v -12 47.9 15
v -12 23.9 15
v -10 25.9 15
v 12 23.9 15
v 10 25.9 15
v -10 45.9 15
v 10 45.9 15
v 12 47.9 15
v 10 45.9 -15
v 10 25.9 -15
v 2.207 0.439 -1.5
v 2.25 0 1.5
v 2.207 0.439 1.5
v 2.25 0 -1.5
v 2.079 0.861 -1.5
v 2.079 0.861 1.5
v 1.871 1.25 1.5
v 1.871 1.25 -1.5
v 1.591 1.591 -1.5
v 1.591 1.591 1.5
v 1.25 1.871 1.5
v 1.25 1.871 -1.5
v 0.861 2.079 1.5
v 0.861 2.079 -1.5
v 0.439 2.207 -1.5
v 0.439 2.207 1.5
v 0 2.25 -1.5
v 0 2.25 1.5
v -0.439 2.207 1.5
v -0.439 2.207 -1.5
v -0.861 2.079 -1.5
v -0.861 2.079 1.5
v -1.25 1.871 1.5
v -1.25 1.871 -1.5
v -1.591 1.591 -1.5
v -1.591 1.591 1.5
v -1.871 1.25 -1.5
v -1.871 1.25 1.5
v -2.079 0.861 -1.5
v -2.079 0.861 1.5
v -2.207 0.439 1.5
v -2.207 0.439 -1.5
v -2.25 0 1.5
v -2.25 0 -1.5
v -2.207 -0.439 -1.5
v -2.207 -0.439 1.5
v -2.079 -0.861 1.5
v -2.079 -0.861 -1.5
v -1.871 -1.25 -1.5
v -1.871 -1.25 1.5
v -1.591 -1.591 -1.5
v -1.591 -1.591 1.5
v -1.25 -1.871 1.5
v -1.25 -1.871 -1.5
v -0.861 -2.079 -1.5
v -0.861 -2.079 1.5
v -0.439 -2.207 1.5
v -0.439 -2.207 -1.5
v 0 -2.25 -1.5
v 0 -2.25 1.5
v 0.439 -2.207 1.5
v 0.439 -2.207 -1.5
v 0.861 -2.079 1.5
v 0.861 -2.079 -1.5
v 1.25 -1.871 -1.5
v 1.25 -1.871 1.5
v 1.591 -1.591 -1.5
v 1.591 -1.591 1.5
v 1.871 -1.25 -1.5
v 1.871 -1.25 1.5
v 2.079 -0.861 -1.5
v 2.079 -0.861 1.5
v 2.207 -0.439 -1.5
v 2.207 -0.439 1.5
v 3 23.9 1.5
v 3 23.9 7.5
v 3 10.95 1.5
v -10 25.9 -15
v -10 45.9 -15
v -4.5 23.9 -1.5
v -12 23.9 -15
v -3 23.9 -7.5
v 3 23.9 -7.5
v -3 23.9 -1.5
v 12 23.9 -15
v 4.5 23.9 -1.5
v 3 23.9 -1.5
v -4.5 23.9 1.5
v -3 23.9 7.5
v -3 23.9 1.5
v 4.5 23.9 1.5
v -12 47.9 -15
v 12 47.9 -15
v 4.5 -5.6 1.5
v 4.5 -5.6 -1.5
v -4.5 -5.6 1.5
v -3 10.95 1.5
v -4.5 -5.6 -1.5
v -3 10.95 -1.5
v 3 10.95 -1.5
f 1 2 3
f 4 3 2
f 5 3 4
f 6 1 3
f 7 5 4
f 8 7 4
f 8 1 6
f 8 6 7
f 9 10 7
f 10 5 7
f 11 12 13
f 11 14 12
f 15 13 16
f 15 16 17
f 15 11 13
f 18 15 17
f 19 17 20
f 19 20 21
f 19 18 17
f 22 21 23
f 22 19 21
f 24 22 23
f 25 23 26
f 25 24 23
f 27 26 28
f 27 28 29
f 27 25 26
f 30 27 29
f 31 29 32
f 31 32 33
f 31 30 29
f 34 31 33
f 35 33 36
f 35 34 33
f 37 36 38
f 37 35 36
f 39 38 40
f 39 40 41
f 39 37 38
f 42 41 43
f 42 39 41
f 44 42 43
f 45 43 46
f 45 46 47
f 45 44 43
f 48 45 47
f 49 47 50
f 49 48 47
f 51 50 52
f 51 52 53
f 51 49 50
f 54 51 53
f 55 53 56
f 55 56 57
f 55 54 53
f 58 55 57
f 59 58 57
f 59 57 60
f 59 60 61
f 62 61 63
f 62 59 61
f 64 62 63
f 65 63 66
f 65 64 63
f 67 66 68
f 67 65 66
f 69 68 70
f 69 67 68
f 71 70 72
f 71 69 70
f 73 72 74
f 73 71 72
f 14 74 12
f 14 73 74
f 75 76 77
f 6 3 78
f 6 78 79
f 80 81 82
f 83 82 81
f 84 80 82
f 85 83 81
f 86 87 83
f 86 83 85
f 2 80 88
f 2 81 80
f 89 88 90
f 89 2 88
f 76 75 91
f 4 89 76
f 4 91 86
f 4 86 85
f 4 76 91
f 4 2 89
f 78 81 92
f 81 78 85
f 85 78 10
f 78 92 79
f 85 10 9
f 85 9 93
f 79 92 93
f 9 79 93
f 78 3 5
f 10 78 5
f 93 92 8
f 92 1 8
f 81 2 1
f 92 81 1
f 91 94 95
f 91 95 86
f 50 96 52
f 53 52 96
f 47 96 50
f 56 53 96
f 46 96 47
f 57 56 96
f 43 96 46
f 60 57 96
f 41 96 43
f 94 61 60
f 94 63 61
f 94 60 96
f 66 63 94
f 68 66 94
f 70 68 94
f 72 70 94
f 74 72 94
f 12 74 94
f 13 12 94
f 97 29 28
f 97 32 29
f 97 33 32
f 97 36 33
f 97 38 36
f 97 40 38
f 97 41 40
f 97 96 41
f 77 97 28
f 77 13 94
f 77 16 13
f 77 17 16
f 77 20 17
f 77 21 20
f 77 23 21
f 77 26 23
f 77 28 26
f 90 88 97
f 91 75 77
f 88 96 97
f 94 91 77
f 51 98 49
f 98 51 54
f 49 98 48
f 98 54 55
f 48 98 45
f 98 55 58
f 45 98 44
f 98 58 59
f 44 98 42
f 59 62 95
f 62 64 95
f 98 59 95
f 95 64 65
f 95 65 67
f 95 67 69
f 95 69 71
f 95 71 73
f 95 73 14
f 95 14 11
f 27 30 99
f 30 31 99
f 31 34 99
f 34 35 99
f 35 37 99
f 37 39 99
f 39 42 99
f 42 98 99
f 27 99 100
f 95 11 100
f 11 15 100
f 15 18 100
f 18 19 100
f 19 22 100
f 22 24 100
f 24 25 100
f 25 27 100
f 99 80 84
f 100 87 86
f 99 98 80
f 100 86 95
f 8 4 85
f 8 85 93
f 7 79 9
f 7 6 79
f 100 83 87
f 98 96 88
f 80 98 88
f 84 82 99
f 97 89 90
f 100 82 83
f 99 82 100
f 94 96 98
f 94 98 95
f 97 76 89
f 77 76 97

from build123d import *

# Parameters (mm, degrees)
CROQUIS1_W               = 9
CROQUIS1_H               = 31.5
CROQUIS1_R               = 2.25
SALIENTE_EXTRUIR1_DEPTH  = 1.5
CROQUIS11_W              = 24
CROQUIS11_H              = 24
CROQUIS11_W_2            = 20
CROQUIS11_H_2            = 20
SALIENTE_EXTRUIR8_DEPTH  = 15
SALIENTE_EXTRUIR11_DEPTH = 3


with BuildPart() as part:
    # Croquis1 → Saliente-Extruir1 (new, symmetric)
    with BuildSketch(Plane.XY):
        with Locations((0, 10.15)):
            Rectangle(CROQUIS1_W, CROQUIS1_H)
        Circle(CROQUIS1_R, mode=Mode.SUBTRACT)
    extrude(amount=SALIENTE_EXTRUIR1_DEPTH, both=True)

    # Croquis11 → Saliente-Extruir8 (add, symmetric)
    with BuildSketch(Plane.XY):
        with Locations((0, 35.9)):
            Rectangle(CROQUIS11_W, CROQUIS11_H)
        with Locations((0, 35.9)):
            Rectangle(CROQUIS11_W_2, CROQUIS11_H_2, mode=Mode.SUBTRACT)
    extrude(amount=SALIENTE_EXTRUIR8_DEPTH, both=True)

    # Croquis13 → Saliente-Extruir11 (add, symmetric)
    with BuildSketch(Plane(origin=(0, 0, 0), x_dir=(0, 0, -1), z_dir=(1, 0, 0))):
        Polygon((1.5, 10.95), (1.5, 23.9), (7.5, 23.9), align=None)
        Polygon((-7.5, 23.9), (-1.5, 10.95), (-1.5, 23.9), align=None)
    extrude(amount=SALIENTE_EXTRUIR11_DEPTH, both=True)


solid = part.part
